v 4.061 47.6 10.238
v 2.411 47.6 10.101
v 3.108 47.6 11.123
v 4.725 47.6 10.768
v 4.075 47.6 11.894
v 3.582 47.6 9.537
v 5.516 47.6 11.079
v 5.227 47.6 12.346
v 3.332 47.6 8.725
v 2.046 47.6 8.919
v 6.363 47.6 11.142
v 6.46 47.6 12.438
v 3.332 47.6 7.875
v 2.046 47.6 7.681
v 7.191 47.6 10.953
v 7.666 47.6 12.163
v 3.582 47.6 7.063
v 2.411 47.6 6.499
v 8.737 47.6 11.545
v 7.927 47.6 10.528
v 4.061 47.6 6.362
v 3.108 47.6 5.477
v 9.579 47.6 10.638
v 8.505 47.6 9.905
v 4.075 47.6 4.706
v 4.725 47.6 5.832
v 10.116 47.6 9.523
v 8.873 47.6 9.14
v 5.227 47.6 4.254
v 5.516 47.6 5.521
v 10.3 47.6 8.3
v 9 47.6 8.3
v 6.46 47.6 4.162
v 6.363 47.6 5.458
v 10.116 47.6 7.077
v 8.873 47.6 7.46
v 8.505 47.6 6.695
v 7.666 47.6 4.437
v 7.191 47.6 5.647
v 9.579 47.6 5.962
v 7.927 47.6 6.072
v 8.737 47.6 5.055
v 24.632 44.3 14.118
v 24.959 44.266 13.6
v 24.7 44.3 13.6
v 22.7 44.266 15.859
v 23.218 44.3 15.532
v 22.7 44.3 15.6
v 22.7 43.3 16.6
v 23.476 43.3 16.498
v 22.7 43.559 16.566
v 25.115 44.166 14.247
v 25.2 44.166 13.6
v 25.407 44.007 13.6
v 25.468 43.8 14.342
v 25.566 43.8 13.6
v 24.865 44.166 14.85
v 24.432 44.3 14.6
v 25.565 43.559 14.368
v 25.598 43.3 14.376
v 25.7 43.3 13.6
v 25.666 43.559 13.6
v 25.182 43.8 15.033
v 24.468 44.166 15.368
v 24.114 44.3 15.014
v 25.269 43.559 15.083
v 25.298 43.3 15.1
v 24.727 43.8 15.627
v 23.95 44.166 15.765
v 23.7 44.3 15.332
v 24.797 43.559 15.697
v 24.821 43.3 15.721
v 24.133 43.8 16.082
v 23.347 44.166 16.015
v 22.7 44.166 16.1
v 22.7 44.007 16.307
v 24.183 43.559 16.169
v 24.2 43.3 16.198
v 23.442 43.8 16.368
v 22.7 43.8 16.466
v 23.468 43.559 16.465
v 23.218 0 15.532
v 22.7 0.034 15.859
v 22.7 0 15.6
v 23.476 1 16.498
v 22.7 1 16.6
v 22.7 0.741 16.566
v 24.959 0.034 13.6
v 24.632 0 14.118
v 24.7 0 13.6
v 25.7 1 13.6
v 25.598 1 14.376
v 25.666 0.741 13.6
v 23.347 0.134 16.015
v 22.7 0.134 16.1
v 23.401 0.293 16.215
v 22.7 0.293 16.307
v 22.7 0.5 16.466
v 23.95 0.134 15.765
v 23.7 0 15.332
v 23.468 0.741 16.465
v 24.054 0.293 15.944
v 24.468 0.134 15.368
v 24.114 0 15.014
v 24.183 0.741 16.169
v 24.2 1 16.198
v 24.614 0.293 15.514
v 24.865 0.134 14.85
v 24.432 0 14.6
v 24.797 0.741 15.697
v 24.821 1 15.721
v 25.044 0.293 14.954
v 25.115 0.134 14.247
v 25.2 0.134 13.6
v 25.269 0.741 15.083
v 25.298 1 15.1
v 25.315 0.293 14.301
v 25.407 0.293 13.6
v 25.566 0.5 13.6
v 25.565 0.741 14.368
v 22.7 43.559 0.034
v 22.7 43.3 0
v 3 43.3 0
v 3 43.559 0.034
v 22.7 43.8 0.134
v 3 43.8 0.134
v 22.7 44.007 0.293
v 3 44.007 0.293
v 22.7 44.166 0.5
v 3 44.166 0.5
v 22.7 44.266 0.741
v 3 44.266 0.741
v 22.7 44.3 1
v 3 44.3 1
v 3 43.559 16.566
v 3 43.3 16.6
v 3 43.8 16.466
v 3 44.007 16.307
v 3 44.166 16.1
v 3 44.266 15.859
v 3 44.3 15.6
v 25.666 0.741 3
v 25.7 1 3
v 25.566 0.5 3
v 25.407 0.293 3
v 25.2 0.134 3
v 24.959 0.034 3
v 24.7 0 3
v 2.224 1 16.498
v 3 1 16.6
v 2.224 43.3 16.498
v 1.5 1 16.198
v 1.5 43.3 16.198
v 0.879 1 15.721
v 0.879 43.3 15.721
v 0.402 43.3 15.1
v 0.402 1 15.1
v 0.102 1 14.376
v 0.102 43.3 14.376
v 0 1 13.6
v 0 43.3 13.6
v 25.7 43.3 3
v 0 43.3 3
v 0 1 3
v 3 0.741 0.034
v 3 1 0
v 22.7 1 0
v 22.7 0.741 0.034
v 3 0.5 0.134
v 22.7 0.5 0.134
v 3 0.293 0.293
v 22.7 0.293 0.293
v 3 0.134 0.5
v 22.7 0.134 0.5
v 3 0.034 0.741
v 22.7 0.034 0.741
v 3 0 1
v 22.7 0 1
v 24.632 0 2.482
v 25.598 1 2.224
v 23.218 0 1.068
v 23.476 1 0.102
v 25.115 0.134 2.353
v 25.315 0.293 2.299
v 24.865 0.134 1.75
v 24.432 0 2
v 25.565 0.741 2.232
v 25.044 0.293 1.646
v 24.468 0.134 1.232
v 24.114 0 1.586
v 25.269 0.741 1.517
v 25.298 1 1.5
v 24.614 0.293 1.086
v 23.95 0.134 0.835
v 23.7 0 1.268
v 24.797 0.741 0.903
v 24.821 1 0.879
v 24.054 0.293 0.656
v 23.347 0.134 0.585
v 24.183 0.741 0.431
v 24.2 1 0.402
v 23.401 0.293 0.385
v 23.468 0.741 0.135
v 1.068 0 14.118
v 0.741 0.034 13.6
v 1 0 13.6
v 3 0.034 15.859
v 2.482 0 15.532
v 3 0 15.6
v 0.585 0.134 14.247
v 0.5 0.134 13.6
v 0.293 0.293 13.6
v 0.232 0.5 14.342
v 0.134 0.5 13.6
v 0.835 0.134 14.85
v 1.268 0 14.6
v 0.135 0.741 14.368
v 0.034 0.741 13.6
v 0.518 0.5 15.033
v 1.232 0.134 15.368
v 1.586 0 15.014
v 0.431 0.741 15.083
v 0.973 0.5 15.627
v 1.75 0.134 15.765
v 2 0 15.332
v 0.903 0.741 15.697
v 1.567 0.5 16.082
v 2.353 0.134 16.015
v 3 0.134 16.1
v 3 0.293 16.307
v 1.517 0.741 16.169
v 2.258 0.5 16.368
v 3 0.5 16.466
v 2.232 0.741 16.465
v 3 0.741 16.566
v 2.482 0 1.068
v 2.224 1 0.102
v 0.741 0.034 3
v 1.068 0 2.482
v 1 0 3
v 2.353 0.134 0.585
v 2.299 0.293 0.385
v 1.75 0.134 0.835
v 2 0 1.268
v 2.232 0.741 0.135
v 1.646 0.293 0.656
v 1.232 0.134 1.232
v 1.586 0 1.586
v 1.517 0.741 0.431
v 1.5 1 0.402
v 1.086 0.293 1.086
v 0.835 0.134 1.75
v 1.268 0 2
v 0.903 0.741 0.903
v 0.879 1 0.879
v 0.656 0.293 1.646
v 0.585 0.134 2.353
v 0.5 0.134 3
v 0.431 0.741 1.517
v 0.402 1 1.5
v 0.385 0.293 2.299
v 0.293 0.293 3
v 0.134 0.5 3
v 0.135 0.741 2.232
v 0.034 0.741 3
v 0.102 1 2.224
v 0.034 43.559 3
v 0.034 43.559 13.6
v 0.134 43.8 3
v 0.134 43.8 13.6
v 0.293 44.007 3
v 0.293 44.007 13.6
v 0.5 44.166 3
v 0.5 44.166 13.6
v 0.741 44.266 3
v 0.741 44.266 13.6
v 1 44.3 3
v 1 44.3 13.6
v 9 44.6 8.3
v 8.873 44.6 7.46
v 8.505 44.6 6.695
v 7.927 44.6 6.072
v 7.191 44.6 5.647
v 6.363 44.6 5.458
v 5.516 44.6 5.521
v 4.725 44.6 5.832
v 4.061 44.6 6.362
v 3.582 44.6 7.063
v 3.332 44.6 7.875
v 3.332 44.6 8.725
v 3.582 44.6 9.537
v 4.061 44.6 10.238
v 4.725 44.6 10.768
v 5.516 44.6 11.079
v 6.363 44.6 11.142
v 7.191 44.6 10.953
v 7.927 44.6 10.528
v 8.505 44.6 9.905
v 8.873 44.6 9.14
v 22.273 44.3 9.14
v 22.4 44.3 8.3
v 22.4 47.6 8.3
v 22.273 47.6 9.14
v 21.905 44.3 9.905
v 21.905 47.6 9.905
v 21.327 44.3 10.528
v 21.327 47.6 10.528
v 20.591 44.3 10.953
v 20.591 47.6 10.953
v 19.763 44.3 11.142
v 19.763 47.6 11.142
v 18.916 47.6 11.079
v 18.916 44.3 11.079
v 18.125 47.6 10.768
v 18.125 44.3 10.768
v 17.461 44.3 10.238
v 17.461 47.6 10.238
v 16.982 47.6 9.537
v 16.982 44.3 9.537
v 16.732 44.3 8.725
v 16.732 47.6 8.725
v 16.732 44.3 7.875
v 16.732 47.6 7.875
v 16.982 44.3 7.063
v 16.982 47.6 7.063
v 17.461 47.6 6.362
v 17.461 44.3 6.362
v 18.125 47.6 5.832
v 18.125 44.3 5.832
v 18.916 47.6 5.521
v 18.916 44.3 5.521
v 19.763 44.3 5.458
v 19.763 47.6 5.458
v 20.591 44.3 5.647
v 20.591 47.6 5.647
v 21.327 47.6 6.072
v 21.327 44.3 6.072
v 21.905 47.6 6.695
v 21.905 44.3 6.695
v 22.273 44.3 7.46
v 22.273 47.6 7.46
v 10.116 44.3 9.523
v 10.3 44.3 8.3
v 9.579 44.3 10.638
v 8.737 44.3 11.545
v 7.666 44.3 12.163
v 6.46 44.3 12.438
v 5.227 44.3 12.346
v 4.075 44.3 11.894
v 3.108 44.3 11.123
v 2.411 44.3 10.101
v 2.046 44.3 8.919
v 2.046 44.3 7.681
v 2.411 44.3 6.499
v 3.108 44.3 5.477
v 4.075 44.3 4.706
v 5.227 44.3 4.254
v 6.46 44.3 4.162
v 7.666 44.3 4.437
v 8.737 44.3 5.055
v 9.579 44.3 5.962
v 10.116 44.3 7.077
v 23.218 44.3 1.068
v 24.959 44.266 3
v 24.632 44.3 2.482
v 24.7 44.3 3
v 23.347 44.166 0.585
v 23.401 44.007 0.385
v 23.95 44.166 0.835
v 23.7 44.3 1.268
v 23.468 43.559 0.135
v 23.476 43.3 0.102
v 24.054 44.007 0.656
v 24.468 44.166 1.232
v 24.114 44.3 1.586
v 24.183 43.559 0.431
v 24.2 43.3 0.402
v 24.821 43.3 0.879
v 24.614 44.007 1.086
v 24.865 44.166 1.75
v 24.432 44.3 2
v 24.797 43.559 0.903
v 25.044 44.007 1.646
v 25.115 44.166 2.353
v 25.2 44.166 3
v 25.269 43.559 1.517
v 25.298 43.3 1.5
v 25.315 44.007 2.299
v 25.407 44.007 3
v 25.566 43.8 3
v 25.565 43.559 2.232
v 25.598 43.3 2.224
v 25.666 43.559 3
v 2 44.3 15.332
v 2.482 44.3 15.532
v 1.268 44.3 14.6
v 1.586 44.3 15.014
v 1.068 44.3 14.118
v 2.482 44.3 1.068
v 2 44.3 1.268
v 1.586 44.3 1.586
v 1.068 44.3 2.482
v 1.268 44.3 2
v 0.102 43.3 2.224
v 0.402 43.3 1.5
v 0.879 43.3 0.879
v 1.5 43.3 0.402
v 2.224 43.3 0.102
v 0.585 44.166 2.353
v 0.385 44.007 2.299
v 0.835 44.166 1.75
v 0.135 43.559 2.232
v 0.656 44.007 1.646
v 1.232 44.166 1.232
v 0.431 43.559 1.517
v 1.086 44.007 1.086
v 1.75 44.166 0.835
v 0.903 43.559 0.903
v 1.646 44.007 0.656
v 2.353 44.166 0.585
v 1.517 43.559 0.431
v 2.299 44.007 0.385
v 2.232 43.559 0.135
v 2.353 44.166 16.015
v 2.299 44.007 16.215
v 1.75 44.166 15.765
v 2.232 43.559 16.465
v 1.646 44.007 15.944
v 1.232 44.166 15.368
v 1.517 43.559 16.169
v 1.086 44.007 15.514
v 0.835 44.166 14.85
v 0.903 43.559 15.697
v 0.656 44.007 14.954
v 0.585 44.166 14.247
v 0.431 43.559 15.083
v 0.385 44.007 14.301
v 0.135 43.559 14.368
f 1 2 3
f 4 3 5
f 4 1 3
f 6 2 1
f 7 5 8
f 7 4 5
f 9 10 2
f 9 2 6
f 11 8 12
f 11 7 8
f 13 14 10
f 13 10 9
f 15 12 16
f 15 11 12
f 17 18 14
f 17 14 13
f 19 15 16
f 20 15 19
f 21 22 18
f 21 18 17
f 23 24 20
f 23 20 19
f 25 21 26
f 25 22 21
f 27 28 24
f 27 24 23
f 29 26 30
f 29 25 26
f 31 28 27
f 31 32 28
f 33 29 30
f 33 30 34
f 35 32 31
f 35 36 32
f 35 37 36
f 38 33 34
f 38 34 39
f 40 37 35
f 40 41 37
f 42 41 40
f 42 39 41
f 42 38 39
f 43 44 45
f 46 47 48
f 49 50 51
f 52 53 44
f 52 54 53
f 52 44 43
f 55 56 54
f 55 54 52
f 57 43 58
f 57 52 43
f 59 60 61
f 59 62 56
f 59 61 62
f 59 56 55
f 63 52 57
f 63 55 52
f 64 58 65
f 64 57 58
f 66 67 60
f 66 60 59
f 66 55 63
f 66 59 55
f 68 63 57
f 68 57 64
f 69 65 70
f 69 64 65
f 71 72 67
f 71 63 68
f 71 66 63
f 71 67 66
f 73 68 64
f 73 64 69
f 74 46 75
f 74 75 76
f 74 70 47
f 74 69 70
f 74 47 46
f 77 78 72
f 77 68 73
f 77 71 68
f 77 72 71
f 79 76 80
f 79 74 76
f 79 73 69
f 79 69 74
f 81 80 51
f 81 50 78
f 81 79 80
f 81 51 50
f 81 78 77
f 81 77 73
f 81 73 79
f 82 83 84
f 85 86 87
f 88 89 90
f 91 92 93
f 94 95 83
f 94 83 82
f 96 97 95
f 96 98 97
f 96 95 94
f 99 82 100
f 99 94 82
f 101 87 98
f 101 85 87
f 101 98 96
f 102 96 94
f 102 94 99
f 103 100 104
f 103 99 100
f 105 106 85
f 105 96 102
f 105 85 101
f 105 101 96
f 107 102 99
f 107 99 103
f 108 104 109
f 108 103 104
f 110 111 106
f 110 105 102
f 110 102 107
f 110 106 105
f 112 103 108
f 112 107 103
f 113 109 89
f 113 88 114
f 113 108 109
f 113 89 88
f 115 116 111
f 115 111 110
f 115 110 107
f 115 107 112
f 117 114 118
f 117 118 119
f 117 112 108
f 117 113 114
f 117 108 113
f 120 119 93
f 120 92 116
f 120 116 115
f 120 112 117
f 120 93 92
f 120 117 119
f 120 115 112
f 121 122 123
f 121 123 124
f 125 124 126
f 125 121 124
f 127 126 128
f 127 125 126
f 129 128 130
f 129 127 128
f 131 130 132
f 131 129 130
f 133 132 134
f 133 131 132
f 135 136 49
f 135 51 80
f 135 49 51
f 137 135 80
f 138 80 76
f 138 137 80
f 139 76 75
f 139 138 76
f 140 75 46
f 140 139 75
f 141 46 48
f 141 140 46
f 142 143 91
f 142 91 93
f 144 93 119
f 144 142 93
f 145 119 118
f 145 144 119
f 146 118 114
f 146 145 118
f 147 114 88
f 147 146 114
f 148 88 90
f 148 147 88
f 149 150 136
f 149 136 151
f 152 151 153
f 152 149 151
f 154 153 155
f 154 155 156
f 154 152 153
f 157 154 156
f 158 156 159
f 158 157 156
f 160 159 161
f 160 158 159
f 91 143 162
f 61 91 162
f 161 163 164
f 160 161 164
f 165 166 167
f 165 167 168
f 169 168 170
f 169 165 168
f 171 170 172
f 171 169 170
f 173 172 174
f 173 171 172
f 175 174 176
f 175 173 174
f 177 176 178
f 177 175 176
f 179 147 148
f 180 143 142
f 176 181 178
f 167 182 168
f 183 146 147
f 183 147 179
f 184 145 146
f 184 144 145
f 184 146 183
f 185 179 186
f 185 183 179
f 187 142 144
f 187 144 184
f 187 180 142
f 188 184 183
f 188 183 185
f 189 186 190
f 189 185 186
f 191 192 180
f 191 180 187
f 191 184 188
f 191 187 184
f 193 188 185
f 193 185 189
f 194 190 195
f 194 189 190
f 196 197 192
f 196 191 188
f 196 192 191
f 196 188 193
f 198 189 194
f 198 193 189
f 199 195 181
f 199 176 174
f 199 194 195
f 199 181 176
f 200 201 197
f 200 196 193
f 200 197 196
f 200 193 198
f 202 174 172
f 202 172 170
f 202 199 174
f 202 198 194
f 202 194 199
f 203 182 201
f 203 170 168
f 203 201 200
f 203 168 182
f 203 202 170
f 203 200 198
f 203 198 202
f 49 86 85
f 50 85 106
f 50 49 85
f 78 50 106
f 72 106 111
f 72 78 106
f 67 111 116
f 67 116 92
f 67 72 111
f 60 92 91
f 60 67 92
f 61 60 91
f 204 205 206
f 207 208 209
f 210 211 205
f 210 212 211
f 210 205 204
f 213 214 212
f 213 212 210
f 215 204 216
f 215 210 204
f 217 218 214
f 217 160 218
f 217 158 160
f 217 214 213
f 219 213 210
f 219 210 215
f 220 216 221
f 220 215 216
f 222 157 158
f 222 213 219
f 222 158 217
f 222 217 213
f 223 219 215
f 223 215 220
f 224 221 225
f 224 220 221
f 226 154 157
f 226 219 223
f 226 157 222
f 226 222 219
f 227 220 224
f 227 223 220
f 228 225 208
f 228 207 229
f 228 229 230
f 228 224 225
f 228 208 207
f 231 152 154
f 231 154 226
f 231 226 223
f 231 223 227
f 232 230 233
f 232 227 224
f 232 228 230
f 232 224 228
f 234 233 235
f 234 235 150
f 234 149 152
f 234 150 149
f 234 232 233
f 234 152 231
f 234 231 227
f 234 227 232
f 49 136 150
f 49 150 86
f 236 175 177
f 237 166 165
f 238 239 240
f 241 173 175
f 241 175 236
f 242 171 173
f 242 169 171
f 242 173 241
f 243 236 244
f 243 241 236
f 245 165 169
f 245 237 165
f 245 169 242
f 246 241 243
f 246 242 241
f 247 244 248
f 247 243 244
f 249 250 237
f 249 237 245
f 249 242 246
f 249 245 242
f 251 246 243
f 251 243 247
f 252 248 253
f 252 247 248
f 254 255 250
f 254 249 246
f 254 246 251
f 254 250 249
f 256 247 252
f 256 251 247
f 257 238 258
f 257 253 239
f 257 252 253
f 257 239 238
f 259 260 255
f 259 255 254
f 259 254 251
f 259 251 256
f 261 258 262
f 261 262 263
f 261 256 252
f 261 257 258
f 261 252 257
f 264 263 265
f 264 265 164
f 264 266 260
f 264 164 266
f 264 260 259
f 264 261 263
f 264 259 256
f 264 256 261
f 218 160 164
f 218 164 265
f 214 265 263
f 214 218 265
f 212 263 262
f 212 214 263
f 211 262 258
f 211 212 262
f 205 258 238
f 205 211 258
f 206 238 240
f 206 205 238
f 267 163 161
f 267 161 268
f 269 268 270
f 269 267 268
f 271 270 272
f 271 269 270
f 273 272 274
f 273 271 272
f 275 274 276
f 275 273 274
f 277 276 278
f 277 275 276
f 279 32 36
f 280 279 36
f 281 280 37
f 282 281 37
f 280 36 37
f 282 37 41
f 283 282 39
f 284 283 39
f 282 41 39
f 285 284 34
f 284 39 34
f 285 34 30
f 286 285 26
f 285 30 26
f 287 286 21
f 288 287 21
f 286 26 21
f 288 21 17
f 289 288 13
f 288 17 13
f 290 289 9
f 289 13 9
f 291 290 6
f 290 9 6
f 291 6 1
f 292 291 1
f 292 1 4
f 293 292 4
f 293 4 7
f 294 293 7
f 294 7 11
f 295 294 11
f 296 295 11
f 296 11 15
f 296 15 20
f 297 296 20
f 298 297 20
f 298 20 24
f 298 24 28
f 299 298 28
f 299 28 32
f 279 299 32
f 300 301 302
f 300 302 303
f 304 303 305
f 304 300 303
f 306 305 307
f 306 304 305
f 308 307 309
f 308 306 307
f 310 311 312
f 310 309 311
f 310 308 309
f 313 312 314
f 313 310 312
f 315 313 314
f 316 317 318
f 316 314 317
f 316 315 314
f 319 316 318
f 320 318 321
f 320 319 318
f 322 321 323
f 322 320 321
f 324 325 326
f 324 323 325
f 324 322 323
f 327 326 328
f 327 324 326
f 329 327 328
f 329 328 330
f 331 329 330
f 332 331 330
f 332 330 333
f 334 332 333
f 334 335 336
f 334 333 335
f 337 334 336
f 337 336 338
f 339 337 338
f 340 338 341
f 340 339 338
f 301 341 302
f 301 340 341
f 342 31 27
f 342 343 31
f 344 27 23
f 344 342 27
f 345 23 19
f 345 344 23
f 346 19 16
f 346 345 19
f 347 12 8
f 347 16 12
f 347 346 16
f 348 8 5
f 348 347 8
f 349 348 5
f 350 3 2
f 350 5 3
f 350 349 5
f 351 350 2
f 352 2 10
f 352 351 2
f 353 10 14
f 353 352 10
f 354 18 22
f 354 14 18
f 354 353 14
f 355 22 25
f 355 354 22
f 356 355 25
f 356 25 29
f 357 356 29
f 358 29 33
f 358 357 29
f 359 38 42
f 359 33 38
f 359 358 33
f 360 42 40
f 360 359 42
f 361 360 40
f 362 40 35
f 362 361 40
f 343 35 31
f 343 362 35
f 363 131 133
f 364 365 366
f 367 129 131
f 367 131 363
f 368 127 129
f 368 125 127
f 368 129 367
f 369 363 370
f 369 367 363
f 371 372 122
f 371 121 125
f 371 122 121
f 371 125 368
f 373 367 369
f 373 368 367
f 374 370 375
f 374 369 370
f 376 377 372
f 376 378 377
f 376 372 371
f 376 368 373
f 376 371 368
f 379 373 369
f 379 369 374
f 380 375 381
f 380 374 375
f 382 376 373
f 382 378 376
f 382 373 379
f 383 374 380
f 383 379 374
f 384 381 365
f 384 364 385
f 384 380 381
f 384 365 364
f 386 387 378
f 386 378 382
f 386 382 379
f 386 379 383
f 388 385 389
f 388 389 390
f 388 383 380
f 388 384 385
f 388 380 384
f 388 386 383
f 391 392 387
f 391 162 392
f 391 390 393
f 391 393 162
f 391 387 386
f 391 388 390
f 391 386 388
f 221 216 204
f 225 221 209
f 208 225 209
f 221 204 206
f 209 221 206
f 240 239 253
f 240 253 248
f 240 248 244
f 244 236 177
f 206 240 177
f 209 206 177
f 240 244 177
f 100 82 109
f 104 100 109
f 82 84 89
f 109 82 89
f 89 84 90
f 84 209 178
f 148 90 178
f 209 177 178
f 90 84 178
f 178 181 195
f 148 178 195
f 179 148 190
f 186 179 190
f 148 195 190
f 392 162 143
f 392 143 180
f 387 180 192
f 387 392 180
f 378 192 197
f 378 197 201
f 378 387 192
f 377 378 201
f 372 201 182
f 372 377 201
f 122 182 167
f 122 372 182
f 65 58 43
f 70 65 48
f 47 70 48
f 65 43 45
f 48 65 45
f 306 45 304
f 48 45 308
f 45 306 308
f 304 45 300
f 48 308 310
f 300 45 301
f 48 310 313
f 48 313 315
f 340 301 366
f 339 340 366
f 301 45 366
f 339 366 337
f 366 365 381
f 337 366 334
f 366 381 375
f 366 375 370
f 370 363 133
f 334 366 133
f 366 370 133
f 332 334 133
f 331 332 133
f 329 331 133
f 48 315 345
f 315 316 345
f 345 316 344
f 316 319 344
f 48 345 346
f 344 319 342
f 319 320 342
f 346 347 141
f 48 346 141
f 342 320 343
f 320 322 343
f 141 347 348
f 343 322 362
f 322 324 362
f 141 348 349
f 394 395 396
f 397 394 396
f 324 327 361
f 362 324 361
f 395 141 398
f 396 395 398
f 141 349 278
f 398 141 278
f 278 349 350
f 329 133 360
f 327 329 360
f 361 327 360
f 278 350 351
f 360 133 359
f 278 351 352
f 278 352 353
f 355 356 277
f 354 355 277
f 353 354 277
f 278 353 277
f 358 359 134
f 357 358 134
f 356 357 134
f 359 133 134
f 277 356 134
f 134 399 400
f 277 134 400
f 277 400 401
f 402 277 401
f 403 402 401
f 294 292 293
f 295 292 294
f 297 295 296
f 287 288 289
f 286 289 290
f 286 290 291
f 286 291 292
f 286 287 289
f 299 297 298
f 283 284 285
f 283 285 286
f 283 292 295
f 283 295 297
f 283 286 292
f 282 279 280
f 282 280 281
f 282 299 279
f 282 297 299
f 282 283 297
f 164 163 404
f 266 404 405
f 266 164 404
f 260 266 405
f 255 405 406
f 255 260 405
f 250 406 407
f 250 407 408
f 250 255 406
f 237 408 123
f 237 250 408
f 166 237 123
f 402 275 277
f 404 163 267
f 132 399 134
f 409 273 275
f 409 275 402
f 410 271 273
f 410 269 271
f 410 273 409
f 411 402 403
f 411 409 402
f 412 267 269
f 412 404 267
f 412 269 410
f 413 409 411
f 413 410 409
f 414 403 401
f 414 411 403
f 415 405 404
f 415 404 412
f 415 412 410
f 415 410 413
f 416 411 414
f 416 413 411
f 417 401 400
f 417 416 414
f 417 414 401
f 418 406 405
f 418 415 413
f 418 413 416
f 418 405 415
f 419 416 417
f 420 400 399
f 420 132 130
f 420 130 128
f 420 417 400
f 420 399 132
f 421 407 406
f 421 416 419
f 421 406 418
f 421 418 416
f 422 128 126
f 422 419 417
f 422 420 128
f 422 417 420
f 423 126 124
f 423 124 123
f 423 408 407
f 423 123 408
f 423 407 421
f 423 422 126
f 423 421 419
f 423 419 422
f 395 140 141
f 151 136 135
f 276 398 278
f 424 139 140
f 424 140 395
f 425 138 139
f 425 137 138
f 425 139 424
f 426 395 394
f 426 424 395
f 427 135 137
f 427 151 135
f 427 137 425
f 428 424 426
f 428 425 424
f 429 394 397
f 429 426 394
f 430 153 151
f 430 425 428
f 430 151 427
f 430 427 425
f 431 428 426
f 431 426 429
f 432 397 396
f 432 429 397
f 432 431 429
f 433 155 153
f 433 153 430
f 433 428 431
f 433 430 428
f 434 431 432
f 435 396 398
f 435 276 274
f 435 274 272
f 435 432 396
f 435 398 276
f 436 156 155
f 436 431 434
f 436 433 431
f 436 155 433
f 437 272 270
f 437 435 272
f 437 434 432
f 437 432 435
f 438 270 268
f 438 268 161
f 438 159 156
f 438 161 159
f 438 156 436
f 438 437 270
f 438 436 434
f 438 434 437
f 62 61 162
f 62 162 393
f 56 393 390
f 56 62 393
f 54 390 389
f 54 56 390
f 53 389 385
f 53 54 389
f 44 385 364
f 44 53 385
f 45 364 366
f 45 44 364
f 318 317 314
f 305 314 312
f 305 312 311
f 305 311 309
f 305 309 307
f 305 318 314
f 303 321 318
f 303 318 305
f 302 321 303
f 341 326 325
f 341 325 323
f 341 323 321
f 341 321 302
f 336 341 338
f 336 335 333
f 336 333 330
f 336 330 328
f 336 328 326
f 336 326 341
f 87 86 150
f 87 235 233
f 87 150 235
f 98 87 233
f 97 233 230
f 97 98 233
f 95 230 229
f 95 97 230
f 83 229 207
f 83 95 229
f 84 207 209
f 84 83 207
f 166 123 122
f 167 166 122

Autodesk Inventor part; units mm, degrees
ref_plane "YZ Plane" through (0, 0, 0) normal (1, 0, 0) x (0, 1, 0)
ref_plane "XZ Plane" through (0, 0, 0) normal (0, 1, 0) x (-1, 0, 0)
ref_plane "XY Plane" through (0, 0, 0) normal (0, 0, 1) x (1, 0, 0)
sketch "Sketch1" plane through (0, 0, 0) normal (0, 0, 1) x (1, 0, 0)
  line L0 (0, 0) -> (25.7, 0)
  line L1 (25.7, 0) -> (25.7, 44.3)
  line L2 (25.7, 44.3) -> (0, 44.3)
  line L3 (0, 44.3) -> (0, 0)
  dimension "d0" = 25.7
  dimension "d1" = 44.3
extrude "Extrusion1" add sketch "Sketch1" along normal blind 16.6
sketch "Sketch2" plane through (0, 44.3, 0) normal (0, 1, 0) x (1, 0, 0)
  line L0 (0, 0) -> (0, -16.6) projected
  circle A0 centre (6.15, -8.3) radius 4.15
  circle A1 centre (19.55, -8.3) radius 2.85
  dimension "d4" = 8.3
  dimension "d5" = 5.7
  dimension "d6" = 13.4
  dimension "d7" = 6.15
extrude "Extrusion2" add sketch "Sketch2" along normal blind 3.3
sketch "Sketch3" plane through (6.15, 47.6, 8.3) normal (0, 1, 0) x (1, 0, 0)
  circle A0 centre (0, 0) radius 4.15 projected
  circle A1 centre (0, 0) radius 2.85
  point P0 (-6.15, 8.3)
  dimension "d10" = 5.7
extrude "Extrusion3" cut sketch "Sketch3" against normal blind 3 contours A1
fillet "Fillet1" radius 3 4 edges at (25.7, 22.15, 16.6) (25.7, 22.15, 0) (0, 22.15, 16.6) (0, 22.15, 0)
fillet "Fillet2" radius 1 16 edges at (12.85, 44.3, 16.6) (24.8213, 44.3, 15.7213) (25.7, 44.3, 8.3) (24.8213, 44.3, 0.8787) (12.85, 44.3, 0) (0.8787, 44.3, 0.8787) (0, 44.3, 8.3) (0.8787, 44.3, 15.7213) (12.85, 0, 16.6) (0.8787, 0, 15.7213) (0, 0, 8.3) (0.8787, 0, 0.8787) (12.85, 0, 0) (24.8213, 0, 0.8787) (25.7, 0, 8.3) (24.8213, 0, 15.7213)
properties part number "Battery9V"
